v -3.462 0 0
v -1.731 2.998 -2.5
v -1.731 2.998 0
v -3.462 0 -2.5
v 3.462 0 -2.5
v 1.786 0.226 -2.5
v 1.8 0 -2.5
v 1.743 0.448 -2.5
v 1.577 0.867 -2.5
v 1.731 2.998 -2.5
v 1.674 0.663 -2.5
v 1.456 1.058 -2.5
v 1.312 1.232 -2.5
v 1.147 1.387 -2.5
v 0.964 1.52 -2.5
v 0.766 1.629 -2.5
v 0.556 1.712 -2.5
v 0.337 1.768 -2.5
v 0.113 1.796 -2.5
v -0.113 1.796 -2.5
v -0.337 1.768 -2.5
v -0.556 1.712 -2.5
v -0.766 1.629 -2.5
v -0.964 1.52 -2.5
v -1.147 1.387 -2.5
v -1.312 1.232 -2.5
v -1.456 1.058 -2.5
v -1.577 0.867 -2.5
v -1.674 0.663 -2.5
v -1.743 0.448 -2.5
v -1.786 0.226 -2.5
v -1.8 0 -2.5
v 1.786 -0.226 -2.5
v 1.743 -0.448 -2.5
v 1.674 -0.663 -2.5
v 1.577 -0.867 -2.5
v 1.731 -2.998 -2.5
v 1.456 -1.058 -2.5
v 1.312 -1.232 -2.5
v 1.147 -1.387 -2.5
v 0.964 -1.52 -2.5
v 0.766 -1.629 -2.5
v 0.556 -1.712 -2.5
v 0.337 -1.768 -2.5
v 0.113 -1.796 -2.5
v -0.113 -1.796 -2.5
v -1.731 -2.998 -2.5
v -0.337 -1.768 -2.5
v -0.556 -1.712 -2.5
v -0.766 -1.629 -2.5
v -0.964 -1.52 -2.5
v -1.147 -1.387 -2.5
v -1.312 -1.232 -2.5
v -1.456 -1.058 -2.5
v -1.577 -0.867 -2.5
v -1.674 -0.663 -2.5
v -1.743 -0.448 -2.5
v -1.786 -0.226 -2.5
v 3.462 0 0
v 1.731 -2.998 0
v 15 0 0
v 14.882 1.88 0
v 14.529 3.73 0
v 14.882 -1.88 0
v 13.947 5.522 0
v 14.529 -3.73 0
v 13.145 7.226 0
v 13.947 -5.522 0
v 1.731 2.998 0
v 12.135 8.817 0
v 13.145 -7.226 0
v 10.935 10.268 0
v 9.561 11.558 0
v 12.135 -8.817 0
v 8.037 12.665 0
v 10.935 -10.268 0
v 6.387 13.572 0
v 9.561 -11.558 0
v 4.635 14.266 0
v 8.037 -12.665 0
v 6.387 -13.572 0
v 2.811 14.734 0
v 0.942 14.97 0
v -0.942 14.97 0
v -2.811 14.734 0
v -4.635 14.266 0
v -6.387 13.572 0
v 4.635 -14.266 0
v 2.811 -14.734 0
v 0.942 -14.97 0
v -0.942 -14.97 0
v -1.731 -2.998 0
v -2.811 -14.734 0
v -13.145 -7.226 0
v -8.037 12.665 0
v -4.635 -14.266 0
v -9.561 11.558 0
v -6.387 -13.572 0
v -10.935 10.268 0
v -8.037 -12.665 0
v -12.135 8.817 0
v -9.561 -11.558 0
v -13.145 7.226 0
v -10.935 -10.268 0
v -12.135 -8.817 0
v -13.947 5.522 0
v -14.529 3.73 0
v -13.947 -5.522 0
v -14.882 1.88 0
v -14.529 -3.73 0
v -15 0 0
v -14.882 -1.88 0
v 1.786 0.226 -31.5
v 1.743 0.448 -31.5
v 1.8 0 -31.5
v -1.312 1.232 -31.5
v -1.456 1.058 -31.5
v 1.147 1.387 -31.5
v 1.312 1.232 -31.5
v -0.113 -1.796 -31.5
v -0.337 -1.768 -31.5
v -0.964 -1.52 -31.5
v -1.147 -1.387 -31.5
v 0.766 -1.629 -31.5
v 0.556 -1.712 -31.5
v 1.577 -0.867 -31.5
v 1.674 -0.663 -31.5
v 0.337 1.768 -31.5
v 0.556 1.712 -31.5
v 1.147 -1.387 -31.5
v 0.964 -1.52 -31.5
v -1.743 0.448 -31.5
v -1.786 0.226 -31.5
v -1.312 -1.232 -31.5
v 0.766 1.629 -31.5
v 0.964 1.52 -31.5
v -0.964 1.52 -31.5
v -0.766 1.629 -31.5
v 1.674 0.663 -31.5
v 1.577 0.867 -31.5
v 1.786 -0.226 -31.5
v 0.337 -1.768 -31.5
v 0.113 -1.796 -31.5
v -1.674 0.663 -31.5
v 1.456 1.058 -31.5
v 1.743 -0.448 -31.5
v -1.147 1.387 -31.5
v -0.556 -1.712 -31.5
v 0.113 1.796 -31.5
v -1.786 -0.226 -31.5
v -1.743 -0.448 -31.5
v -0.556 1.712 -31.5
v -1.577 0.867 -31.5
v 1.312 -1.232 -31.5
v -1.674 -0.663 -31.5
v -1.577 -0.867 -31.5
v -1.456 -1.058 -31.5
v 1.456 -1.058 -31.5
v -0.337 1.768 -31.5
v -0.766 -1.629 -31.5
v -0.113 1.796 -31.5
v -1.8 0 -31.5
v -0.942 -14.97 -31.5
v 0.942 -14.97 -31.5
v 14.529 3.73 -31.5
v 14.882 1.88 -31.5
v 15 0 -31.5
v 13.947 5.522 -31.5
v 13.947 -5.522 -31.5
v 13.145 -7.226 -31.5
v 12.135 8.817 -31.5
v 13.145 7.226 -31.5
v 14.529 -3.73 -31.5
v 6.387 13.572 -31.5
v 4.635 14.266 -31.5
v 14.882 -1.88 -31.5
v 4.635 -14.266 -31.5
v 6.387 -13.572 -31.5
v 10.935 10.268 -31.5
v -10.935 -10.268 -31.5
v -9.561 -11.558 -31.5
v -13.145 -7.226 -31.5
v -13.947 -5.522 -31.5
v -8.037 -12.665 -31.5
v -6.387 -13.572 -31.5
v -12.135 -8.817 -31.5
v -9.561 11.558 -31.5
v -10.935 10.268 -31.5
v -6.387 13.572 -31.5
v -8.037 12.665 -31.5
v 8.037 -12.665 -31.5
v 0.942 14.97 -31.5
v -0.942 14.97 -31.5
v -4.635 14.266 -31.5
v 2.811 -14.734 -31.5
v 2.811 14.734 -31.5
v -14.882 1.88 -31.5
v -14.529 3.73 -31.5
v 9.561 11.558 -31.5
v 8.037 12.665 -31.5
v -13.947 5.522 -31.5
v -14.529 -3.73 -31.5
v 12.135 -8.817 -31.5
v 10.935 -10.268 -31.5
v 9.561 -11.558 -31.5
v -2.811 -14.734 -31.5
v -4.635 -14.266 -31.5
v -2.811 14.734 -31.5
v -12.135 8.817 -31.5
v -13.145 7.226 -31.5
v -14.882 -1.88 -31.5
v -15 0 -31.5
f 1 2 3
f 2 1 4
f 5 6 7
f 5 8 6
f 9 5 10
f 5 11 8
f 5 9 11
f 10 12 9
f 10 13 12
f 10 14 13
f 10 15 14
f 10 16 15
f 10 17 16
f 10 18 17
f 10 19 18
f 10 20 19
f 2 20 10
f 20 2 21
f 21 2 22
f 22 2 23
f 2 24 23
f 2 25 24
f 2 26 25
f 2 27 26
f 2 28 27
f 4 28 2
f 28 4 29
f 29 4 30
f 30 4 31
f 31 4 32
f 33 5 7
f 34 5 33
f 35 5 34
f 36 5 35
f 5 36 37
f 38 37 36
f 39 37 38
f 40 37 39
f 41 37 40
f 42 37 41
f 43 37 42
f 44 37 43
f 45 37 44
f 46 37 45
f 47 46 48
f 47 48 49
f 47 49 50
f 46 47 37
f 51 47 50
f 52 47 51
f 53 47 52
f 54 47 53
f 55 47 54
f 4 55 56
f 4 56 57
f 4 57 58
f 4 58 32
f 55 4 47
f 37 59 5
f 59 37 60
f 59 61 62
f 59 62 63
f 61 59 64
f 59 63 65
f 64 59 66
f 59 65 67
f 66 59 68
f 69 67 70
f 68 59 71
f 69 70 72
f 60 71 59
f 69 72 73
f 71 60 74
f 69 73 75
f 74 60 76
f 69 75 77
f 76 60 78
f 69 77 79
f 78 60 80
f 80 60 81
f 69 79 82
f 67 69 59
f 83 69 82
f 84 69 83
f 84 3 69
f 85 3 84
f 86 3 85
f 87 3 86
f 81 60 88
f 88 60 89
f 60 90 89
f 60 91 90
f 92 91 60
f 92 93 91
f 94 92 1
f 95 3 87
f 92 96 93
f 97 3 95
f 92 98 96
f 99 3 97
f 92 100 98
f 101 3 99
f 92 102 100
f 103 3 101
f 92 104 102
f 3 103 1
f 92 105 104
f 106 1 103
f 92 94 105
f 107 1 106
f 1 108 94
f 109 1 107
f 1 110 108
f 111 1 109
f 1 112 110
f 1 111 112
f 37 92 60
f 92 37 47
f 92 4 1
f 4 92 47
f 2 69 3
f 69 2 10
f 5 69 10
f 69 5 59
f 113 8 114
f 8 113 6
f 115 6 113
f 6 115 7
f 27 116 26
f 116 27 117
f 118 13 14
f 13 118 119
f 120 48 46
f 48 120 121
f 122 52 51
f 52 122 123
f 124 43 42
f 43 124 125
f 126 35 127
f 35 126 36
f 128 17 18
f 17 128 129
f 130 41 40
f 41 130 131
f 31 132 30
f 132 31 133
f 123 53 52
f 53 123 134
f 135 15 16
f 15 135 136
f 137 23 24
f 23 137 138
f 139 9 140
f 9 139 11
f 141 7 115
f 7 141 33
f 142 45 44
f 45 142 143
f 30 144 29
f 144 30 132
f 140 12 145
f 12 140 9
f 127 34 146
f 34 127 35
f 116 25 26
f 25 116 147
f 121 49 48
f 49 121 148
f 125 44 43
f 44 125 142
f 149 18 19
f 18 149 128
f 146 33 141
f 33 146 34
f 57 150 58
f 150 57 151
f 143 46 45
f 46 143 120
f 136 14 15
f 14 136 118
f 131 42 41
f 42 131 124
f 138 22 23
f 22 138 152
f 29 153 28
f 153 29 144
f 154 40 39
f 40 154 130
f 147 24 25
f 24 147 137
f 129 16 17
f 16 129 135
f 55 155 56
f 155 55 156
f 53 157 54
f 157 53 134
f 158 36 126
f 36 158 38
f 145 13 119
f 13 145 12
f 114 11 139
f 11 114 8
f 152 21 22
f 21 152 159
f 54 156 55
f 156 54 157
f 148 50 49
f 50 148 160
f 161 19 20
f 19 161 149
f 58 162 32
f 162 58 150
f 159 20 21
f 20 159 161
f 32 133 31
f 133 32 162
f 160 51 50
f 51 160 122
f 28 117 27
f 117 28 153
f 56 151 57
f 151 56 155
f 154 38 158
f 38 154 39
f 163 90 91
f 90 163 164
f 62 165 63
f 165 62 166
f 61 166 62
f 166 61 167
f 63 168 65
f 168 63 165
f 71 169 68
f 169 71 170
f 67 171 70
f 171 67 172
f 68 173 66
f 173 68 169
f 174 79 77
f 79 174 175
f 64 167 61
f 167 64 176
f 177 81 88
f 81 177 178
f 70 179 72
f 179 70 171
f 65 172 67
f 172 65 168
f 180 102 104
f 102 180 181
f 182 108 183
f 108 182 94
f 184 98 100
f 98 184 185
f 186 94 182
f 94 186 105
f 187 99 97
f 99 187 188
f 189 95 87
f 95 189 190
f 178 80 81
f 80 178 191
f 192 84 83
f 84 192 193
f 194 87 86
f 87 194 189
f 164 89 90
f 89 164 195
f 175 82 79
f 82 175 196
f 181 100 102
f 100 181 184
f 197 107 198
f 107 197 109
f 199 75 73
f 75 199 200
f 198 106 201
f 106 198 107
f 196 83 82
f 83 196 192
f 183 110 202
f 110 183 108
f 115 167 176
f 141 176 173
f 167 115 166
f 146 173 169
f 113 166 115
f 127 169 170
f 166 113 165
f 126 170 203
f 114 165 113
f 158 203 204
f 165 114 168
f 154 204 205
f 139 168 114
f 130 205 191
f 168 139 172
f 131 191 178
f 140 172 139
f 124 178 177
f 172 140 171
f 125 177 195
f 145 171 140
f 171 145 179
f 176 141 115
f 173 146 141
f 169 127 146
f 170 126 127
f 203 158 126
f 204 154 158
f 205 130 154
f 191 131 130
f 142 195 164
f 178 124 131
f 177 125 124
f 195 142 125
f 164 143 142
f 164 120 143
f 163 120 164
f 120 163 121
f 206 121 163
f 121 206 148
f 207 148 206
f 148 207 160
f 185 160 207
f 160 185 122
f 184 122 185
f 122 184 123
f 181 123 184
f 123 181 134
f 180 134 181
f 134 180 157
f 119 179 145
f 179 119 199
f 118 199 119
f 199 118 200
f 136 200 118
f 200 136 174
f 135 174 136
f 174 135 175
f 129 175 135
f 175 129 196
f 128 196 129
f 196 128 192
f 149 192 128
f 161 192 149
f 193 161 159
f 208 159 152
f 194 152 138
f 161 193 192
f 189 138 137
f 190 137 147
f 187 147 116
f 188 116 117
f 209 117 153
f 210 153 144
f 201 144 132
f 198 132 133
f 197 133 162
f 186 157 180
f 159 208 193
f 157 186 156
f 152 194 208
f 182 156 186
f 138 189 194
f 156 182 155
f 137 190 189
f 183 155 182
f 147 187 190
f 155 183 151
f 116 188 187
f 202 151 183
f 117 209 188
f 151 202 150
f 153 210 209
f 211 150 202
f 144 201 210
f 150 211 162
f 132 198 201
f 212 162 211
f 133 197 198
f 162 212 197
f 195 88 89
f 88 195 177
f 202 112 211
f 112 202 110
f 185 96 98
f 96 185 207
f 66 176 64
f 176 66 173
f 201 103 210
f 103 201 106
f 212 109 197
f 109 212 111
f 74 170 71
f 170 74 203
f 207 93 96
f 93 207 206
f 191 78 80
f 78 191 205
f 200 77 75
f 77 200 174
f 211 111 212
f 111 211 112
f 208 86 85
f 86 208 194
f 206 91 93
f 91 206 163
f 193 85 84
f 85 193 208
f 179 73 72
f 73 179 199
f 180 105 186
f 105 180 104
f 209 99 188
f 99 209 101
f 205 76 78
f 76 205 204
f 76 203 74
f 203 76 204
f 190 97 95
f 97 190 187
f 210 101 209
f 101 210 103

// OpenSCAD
$fn = 50;

difference() {
	union() {
		translate(v = [0, 0, -31.5]) {
			cylinder(h = 31.5, r = 15.0);
		}
	}
	union() {
		translate(v = [0, 0, 0]) {
			rotate(a = [0, 0, 0]) {
				difference() {
					union() {
						translate(v = [0, 0, -2.5]) {
							linear_extrude(height = 2.5) {
								polygon(points = [[3.4619999999999997, 0.0], [1.7310000000000003, 2.9981799479017264], [-1.7309999999999992, 2.9981799479017264], [-3.4619999999999997, 4.2397272186481365e-16], [-1.7310000000000014, -2.998179947901726], [1.7309999999999977, -2.9981799479017277]]);
							}
						}
					}
					union();
				}
			}
		}
		#translate(v = [0, 0, -100.0]) {
			cylinder(h = 200, r = 1.8);
		}
	}
}
